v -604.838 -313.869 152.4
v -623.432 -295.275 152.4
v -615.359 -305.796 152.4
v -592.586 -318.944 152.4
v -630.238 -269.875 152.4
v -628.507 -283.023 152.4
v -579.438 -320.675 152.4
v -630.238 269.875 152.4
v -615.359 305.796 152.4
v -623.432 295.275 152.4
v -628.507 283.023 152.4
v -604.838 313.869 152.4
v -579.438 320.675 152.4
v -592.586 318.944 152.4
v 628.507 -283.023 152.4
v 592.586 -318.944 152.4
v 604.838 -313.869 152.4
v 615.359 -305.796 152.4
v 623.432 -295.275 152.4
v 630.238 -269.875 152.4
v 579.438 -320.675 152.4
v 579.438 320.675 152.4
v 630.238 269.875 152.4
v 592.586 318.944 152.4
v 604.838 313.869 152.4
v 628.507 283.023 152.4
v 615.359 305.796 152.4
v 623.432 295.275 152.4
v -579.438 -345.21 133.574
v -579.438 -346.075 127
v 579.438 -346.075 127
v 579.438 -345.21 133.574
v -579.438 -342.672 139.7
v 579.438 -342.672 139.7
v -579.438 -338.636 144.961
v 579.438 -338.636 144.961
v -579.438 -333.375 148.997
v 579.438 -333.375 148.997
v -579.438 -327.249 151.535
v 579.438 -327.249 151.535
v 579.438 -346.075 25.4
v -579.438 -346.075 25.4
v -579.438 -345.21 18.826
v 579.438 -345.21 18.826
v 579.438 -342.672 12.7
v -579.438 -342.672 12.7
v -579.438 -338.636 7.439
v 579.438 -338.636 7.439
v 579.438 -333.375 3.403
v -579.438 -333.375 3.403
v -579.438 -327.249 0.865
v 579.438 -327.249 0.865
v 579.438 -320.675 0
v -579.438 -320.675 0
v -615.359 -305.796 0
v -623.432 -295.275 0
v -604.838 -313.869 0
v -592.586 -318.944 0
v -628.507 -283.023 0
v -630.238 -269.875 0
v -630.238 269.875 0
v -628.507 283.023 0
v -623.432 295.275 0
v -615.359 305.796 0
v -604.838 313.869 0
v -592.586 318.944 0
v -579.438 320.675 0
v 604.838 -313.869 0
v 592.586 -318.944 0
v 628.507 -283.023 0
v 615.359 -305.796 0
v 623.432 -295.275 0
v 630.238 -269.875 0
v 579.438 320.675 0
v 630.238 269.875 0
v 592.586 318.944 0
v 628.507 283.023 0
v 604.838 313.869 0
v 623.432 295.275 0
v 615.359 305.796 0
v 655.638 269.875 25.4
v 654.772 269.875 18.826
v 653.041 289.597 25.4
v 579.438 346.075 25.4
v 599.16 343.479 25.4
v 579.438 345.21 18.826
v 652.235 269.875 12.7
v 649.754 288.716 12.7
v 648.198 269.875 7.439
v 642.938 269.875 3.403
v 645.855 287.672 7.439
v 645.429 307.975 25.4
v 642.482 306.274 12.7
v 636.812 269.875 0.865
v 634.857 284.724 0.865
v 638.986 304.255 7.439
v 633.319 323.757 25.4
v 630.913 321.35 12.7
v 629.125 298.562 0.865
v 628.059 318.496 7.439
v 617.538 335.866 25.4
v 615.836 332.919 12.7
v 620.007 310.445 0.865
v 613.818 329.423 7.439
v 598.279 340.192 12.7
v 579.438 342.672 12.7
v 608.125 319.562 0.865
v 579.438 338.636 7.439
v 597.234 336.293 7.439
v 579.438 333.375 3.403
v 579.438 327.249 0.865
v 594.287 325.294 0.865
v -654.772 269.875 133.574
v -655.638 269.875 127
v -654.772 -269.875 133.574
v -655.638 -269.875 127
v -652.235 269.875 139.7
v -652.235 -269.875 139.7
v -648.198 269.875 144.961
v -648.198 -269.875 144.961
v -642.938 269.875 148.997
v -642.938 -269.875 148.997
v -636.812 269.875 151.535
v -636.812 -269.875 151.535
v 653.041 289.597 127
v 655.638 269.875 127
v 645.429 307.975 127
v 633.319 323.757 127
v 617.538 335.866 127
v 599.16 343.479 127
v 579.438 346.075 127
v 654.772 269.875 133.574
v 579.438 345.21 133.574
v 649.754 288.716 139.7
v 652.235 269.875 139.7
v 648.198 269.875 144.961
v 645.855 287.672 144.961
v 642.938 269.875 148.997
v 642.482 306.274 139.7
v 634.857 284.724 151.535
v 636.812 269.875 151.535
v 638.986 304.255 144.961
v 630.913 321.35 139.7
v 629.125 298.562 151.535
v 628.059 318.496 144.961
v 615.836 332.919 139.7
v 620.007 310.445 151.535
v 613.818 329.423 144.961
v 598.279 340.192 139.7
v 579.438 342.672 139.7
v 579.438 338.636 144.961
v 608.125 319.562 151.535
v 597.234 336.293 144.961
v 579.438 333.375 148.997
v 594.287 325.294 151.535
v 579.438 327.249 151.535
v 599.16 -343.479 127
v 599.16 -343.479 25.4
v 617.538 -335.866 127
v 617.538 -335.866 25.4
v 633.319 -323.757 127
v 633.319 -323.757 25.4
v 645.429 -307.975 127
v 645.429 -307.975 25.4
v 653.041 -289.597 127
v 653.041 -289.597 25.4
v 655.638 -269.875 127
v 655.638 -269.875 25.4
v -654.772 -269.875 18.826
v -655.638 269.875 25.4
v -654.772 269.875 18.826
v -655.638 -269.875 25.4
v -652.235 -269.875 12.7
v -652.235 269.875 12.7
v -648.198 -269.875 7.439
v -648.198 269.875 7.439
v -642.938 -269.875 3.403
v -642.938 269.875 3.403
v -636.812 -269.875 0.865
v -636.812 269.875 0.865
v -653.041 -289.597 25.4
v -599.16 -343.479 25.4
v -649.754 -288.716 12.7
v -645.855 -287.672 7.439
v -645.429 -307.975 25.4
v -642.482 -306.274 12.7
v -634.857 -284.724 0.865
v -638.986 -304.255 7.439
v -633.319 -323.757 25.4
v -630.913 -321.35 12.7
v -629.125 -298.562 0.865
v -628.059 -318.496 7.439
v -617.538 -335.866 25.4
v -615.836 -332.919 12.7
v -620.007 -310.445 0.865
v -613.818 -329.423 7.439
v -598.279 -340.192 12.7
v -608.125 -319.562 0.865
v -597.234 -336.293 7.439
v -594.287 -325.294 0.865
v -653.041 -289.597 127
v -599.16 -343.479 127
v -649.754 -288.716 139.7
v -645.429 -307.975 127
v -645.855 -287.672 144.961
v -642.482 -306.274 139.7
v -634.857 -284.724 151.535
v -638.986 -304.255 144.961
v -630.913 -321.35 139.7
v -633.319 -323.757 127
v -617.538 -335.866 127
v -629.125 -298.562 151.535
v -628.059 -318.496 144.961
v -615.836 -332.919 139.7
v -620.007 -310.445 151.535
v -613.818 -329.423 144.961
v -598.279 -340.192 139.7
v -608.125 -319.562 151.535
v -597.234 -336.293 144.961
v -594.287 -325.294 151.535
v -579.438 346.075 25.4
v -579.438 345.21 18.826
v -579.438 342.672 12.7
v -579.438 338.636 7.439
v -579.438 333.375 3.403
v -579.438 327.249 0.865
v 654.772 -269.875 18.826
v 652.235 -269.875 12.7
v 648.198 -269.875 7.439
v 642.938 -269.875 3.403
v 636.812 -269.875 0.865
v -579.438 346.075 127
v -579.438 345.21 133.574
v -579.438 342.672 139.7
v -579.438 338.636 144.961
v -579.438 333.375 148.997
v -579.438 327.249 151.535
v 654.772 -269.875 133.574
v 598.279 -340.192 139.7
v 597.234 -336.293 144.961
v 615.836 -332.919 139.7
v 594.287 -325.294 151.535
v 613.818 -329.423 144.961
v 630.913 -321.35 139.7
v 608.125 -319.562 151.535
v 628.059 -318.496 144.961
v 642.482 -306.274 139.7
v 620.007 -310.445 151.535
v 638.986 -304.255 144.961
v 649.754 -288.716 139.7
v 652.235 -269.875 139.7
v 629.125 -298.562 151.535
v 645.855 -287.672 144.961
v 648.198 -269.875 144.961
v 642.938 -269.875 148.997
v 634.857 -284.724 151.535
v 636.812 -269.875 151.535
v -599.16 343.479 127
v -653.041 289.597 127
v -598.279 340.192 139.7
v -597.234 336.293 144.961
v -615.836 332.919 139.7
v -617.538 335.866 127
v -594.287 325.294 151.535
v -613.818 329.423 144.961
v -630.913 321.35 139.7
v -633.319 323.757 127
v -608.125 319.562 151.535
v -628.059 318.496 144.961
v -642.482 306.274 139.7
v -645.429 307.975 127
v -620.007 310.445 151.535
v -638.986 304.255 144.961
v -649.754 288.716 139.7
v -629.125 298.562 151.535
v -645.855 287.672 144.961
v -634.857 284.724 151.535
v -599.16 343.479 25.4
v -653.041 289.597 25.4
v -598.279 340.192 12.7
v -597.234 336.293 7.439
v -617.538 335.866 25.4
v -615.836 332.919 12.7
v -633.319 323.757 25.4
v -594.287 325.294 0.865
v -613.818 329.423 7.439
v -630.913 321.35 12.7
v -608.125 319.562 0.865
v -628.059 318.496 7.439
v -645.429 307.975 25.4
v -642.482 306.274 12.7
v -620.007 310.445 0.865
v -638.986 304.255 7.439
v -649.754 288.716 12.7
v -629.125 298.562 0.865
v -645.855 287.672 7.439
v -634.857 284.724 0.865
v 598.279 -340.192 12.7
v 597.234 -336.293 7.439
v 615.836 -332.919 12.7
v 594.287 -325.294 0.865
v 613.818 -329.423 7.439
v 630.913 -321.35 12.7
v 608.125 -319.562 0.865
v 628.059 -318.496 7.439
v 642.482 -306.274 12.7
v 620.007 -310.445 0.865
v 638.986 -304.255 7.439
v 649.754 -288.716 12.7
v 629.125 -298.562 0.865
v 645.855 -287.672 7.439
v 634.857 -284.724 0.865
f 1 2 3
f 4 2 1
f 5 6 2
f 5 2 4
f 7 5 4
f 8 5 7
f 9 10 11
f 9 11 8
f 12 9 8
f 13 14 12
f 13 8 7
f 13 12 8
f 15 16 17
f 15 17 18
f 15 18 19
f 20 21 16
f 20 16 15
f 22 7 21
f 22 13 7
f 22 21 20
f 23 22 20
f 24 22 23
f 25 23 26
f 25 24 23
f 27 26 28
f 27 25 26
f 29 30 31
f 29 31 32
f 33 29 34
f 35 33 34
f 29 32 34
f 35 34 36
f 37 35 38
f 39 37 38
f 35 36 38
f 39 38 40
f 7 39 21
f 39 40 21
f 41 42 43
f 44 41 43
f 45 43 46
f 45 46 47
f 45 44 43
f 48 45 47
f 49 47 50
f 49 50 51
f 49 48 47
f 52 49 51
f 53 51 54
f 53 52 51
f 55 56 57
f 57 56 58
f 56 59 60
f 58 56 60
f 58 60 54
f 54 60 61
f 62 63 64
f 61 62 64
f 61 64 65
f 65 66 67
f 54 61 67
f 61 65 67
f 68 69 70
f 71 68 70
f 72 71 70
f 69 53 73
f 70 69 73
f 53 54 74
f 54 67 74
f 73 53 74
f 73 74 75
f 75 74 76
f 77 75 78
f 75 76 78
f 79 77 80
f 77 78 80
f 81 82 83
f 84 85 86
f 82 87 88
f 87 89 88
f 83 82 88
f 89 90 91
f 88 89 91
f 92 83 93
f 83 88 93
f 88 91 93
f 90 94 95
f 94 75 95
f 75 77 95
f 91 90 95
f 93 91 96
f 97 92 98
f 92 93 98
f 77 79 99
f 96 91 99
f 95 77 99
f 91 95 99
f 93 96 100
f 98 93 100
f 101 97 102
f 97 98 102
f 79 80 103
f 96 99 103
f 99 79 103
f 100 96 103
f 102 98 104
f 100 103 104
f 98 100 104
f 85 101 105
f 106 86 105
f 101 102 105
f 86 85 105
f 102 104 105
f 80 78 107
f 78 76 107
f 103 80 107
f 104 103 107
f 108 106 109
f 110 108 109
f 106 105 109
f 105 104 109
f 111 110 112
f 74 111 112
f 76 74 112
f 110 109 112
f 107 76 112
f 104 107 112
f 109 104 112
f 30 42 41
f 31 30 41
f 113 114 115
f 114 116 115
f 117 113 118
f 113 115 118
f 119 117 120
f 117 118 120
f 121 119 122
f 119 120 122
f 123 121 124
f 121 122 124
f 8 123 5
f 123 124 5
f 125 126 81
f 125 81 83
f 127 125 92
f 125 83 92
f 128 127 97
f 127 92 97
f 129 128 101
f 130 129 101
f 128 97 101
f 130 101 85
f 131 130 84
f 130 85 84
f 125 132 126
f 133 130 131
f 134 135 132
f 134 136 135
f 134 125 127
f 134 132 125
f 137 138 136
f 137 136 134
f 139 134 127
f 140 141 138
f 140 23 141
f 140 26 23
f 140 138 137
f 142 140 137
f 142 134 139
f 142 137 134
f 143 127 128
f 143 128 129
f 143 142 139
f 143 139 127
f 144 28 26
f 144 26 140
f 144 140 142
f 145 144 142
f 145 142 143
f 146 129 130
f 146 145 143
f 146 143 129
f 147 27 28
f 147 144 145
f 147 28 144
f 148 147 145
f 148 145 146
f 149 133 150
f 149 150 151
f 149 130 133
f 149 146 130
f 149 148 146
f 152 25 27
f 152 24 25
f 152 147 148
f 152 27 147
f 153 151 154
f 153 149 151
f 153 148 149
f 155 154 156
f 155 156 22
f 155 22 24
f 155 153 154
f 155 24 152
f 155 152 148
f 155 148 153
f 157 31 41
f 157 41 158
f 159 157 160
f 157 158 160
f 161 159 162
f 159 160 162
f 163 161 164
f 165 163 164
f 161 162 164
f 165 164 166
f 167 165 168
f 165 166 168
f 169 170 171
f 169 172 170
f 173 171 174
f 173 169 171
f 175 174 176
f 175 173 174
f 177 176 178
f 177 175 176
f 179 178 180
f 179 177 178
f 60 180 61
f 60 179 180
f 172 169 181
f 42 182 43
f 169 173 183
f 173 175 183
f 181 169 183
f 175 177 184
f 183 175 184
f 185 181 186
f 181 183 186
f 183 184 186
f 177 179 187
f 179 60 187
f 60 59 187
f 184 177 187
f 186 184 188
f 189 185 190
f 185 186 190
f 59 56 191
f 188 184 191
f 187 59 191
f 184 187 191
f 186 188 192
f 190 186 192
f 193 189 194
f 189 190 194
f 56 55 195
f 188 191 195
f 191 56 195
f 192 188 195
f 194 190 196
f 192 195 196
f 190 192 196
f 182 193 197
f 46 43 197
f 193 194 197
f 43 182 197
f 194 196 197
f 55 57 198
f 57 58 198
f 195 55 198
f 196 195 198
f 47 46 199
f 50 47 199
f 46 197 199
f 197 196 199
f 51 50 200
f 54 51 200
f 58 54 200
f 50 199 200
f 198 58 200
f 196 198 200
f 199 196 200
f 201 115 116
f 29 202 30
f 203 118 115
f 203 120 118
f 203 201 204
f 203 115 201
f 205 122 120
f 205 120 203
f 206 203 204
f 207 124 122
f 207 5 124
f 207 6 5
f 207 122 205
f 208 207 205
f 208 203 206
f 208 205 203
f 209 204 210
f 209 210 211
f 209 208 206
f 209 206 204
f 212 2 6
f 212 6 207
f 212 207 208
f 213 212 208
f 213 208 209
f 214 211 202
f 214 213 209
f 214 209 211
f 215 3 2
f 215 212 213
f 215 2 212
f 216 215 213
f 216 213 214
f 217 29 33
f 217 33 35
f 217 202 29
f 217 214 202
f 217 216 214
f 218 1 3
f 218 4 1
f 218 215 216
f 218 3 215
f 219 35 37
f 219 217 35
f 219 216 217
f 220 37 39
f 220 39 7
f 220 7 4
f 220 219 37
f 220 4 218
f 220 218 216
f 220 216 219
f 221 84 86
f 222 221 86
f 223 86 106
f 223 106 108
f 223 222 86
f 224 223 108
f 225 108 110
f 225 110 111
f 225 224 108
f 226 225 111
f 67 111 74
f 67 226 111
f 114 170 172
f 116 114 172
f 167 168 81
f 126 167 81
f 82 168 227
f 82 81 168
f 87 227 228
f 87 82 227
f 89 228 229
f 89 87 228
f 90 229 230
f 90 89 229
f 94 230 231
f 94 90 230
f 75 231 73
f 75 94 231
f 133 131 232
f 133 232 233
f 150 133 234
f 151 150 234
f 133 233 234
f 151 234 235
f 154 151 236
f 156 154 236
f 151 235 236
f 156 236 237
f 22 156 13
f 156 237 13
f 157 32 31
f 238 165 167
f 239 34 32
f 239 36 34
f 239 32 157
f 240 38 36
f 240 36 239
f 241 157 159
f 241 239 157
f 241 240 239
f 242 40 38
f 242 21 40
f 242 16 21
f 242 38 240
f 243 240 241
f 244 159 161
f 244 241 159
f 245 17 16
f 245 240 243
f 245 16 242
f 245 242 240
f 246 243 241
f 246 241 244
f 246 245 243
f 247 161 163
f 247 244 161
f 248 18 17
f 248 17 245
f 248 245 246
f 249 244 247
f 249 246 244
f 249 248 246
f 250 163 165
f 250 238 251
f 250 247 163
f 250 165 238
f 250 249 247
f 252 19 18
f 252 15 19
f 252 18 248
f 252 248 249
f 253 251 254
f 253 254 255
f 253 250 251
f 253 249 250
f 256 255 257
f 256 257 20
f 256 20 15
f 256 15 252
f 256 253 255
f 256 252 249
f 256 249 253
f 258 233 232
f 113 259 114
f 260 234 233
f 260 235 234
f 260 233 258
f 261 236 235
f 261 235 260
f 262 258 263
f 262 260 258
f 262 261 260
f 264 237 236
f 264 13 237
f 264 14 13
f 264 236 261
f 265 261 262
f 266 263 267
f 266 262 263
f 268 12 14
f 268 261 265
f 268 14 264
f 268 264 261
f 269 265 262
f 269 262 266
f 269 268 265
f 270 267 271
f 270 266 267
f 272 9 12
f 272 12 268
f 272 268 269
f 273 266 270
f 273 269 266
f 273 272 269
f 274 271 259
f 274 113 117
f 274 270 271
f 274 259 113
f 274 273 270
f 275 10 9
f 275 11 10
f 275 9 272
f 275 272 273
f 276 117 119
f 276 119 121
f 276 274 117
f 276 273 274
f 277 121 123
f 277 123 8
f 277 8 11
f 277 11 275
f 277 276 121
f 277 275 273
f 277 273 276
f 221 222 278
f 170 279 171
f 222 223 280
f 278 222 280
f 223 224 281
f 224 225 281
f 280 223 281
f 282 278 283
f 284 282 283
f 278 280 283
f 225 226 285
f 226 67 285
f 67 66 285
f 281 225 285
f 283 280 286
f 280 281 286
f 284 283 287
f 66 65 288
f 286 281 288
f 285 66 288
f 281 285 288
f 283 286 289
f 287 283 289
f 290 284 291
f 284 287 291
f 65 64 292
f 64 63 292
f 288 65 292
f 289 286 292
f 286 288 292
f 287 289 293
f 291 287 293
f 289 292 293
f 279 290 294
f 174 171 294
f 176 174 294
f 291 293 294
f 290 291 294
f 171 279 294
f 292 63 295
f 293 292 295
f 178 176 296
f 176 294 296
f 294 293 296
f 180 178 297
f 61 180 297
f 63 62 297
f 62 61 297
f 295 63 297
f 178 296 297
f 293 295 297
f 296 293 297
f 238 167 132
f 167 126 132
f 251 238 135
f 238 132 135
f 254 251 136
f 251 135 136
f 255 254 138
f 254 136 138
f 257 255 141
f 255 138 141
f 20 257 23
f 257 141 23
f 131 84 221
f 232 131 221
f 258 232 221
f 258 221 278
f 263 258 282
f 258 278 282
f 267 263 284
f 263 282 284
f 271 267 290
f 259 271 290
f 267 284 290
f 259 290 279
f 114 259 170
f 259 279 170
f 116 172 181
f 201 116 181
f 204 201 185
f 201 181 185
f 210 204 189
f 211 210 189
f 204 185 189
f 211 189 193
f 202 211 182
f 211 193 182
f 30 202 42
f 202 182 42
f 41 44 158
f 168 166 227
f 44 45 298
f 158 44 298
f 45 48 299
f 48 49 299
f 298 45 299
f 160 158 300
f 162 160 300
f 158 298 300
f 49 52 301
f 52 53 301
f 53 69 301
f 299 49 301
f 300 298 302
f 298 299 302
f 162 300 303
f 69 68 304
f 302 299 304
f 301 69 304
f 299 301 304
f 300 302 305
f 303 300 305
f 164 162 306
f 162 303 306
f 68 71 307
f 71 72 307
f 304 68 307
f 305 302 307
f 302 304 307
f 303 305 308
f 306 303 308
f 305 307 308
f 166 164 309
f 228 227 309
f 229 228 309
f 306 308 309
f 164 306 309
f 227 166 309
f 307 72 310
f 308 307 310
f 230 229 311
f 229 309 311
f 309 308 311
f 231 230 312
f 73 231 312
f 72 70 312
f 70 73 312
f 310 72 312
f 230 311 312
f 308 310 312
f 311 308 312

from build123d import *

# Parameters (mm, degrees)
F1_DEPTH = 152.4
F2_R     = 25.4


with BuildPart() as f1:
    # F0 (on Top) → F1 (new body)
    with BuildSketch(Plane.XY):
        with BuildLine():
            ThreePointArc((655.6375, 269.875), (633.319037, 323.756537), (579.4375, 346.075))
            Line((579.4375, 346.075), (-579.4375, 346.075))
            ThreePointArc((-579.4375, 346.075), (-633.319037, 323.756537), (-655.6375, 269.875))
            Line((-655.6375, 269.875), (-655.6375, -269.875))
            ThreePointArc((-655.6375, -269.875), (-633.319037, -323.756537), (-579.4375, -346.075))
            Line((-579.4375, -346.075), (579.4375, -346.075))
            ThreePointArc((579.4375, -346.075), (633.319037, -323.756537), (655.6375, -269.875))
            Line((655.6375, -269.875), (655.6375, 269.875))
        make_face()
    extrude(amount=F1_DEPTH)

    # F2
    f2_edges = [f1.edges().sort_by_distance(p)[0] for p in [
        (0, -346.075, 152.4),
        (0, -346.075, 0),
    ]]
    fillet(f2_edges, radius=F2_R)


solid = f1.part
